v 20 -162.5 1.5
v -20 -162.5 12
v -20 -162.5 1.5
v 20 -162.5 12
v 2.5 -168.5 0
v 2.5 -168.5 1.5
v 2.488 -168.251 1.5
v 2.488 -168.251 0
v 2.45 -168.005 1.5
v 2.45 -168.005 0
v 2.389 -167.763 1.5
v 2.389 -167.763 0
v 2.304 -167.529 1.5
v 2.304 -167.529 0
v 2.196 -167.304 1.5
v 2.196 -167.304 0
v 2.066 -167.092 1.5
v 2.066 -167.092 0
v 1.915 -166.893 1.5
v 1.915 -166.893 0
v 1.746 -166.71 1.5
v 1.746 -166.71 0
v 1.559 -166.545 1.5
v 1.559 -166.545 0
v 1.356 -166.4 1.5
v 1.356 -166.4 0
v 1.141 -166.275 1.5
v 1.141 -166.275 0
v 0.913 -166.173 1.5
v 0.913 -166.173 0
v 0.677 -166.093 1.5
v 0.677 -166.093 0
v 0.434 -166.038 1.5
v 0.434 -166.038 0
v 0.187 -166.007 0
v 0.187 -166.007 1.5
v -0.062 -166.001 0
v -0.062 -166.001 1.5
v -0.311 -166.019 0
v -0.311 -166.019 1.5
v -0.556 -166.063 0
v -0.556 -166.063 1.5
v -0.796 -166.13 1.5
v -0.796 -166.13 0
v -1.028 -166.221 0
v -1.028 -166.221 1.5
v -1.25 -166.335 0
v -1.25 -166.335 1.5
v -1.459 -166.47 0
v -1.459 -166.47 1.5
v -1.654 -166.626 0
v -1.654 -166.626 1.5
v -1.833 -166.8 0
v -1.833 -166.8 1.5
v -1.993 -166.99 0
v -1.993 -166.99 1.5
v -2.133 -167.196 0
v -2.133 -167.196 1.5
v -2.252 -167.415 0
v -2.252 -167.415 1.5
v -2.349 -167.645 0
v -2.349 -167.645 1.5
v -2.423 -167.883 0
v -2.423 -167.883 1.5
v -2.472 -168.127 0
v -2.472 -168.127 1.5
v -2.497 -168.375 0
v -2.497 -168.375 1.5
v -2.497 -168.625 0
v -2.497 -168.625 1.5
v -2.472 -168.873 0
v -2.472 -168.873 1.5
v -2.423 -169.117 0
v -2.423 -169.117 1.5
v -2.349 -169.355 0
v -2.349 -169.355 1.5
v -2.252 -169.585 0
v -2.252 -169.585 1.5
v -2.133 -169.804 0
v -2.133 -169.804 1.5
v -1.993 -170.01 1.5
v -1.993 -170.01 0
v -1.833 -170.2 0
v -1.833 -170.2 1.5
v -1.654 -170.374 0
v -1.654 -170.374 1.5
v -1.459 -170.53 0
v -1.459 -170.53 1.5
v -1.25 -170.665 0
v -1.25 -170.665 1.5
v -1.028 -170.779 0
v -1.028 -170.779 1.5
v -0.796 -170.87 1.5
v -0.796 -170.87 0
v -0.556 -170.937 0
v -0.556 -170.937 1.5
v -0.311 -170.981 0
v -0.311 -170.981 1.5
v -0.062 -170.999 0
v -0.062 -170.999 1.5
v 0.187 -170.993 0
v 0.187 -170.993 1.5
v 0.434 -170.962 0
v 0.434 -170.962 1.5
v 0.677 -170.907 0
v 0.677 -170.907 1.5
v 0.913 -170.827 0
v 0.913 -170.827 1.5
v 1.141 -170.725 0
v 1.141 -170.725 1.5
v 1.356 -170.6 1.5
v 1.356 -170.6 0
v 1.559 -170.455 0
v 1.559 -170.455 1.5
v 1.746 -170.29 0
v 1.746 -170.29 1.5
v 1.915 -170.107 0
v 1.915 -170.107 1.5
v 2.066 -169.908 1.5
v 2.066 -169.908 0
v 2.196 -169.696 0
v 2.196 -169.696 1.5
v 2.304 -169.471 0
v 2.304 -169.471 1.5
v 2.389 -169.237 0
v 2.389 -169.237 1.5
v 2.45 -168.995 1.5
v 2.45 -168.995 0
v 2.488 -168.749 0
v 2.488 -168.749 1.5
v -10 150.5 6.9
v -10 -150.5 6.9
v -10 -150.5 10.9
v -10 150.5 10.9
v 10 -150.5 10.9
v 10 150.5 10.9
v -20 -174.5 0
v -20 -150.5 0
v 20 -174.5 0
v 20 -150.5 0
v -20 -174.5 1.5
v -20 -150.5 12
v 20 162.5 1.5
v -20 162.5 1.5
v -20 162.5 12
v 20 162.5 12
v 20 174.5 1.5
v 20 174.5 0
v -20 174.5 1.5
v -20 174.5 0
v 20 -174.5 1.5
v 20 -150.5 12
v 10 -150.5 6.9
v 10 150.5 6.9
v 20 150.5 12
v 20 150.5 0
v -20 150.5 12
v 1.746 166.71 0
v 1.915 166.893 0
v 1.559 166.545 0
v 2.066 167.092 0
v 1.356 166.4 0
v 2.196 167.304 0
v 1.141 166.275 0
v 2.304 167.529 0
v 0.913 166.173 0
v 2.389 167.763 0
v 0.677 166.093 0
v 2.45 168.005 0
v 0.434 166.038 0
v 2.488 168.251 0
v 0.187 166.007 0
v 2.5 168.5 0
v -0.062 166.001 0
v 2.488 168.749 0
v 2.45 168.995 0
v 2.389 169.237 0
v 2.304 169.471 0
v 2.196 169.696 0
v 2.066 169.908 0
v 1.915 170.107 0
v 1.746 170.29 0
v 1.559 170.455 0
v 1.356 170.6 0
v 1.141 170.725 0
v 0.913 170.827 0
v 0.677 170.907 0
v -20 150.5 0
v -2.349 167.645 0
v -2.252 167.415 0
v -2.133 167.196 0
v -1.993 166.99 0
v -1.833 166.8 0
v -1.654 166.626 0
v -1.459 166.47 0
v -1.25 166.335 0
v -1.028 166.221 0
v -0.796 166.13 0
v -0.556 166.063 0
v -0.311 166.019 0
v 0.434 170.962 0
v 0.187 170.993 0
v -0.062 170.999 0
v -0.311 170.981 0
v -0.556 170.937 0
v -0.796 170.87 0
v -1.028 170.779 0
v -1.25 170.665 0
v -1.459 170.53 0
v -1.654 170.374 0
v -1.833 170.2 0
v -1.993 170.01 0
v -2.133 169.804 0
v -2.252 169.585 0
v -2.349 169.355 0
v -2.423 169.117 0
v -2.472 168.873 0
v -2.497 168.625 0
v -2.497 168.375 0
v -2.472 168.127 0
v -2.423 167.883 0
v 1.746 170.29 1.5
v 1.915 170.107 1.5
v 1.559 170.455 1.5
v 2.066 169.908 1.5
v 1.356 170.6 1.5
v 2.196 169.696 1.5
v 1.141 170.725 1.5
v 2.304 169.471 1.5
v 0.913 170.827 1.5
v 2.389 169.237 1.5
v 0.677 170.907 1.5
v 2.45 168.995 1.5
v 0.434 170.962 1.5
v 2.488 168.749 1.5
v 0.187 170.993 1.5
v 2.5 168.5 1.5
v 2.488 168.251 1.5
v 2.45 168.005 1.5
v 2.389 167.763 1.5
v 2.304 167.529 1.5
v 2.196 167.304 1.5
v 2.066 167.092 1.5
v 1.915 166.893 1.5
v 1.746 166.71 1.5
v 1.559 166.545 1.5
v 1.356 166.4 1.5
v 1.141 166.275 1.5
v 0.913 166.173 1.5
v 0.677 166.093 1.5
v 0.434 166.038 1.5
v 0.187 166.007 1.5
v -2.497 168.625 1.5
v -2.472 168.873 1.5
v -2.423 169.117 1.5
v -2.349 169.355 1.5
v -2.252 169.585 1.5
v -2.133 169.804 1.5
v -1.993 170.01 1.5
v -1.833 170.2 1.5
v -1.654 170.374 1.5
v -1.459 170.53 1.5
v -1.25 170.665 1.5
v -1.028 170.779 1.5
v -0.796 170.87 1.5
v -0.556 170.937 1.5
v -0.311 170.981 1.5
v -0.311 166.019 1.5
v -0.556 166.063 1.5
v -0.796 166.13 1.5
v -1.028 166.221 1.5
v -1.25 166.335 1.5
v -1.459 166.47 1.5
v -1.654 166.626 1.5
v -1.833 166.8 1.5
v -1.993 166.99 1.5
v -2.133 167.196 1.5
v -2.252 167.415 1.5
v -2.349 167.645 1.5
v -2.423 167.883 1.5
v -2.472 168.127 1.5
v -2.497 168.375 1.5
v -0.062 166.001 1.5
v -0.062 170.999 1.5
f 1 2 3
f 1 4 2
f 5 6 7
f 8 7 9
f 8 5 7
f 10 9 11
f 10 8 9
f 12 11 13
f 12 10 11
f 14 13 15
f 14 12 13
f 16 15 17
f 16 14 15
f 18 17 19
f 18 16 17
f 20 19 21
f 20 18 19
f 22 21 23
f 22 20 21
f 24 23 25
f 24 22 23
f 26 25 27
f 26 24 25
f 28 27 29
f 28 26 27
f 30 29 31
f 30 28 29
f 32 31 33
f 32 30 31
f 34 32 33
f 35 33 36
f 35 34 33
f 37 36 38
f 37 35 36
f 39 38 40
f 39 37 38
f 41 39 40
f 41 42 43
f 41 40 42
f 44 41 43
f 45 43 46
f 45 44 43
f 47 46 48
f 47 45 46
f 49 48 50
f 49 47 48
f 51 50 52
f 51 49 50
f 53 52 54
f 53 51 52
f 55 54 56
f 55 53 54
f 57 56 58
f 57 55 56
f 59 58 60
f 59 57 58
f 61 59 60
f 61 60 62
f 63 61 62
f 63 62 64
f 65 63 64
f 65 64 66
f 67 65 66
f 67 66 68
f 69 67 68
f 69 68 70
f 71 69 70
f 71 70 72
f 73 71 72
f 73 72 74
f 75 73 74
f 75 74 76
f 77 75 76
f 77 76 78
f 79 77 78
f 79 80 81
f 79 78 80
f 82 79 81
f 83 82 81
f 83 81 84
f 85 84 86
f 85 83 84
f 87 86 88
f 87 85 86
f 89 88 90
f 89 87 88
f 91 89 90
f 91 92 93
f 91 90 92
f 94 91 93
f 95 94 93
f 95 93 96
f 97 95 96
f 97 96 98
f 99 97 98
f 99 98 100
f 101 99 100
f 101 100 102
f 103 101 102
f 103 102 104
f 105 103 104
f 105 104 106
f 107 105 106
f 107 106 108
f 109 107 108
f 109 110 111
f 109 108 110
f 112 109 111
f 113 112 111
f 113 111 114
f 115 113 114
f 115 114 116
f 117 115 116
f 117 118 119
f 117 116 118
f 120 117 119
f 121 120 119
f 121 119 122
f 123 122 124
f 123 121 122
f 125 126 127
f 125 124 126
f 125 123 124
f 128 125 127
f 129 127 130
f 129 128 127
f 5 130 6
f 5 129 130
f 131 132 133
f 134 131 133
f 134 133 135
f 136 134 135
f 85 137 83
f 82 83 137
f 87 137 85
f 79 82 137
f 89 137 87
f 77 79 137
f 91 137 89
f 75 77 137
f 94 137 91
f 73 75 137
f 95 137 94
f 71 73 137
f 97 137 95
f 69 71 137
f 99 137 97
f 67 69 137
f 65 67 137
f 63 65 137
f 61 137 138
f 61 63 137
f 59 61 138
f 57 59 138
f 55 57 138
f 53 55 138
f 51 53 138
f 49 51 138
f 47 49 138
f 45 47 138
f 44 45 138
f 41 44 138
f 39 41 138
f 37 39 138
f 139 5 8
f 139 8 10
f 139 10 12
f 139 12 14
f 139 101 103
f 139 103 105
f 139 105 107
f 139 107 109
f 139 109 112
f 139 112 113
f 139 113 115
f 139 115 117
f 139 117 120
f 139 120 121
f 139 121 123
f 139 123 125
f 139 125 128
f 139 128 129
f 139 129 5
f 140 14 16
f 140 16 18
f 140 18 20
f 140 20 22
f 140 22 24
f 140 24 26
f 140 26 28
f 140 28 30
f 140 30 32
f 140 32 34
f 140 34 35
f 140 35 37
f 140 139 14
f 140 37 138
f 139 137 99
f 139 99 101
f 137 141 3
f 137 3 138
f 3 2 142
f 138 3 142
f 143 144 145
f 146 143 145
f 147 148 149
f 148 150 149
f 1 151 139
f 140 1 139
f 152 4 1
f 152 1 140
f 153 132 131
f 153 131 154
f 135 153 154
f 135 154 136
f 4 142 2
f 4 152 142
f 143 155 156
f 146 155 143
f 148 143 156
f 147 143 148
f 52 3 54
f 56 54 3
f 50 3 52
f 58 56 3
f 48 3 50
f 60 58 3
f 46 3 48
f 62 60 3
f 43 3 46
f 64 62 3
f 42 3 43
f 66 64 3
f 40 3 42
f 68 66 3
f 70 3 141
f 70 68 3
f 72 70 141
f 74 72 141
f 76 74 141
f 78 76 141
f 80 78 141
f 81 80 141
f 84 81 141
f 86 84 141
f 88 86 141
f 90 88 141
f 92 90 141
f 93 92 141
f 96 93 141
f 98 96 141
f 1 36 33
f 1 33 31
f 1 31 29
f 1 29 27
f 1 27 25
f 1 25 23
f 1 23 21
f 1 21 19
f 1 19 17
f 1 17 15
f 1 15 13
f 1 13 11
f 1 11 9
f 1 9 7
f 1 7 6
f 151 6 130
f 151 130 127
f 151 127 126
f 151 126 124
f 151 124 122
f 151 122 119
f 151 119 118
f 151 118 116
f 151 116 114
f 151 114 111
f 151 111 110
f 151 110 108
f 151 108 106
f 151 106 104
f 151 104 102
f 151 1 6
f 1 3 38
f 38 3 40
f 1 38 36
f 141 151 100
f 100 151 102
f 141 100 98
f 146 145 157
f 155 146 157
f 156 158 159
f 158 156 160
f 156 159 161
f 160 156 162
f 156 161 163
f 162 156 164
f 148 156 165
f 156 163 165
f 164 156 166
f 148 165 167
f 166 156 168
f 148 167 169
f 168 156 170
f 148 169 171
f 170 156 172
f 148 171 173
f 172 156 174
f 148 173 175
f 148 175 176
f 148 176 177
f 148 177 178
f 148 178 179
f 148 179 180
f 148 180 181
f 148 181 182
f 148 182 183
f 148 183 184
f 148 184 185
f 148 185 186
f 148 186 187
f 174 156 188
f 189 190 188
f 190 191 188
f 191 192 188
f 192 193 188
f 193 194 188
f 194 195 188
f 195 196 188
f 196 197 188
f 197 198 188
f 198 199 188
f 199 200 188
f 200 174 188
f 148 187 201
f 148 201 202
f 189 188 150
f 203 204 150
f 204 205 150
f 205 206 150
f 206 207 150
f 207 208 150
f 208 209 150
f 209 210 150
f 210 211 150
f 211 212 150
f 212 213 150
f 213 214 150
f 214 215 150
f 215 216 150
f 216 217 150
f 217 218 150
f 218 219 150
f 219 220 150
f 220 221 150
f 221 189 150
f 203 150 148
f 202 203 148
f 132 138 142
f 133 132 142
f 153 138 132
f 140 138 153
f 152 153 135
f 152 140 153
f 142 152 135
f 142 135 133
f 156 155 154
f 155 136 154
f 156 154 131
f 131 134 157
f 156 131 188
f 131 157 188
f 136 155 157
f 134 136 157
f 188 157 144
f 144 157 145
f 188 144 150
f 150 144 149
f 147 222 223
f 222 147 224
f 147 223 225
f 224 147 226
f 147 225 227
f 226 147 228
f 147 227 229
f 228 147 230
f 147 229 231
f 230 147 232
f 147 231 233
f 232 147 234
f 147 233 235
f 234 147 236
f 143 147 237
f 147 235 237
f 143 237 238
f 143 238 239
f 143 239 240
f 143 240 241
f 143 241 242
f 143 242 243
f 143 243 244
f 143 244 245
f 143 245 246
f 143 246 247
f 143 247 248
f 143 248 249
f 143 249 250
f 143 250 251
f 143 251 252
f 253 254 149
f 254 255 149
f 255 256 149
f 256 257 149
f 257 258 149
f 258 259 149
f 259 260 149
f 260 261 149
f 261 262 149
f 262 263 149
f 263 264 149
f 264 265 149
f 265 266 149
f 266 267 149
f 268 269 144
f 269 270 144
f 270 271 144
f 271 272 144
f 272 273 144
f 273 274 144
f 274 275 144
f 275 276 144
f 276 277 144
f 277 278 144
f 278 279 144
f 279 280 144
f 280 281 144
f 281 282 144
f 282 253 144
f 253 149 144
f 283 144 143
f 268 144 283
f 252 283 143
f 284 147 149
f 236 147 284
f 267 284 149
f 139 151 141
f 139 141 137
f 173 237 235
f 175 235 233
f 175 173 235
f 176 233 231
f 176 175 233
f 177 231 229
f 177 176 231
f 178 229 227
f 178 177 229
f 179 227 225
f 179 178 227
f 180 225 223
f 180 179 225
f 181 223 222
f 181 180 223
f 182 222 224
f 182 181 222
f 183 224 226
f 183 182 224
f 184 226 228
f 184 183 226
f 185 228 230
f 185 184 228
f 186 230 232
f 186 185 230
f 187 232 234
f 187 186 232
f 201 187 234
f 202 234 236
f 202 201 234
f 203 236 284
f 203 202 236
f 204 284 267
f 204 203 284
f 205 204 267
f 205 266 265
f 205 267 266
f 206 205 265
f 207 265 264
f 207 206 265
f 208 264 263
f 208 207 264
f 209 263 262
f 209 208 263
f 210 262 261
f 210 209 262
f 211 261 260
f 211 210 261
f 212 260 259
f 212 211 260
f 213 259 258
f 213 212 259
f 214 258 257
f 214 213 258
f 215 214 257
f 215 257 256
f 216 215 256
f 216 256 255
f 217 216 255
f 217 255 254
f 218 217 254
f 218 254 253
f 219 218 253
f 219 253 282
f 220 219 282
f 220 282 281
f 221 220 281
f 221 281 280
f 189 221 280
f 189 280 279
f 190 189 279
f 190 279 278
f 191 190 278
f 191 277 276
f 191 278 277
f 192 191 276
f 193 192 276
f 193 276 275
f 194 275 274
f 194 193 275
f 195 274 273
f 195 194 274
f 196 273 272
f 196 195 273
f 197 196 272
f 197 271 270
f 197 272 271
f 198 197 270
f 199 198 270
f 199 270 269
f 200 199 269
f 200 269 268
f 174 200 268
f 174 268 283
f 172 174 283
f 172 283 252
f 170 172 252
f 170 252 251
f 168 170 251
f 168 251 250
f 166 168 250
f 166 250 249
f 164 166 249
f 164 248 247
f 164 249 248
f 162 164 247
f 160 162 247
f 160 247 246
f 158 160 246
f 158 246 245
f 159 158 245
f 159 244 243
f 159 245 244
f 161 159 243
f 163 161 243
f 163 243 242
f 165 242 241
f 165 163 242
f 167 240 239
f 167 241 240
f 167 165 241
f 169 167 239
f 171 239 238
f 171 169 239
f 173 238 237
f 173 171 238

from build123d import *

# Parameters (mm, degrees)
SKETCH_W          = 20
SKETCH_H          = 4
PAD_DEPTH         = 162.5
PAD001_DEPTH      = 20
SKETCH002_R       = 2.5
POCKET_DEPTH      = 0.001
POCKET_DEPTH_BACK = -12.001


with BuildPart() as part:
    # Sketch → Pad (new body, symmetric)
    with BuildSketch(Plane.XZ):
        with Locations((0, 8.9)):
            Rectangle(SKETCH_W, SKETCH_H)
    extrude(amount=PAD_DEPTH, both=True)

    # Sketch001 → Pad001 (join, symmetric)
    with BuildSketch(Plane.YZ):
        Polygon((150.5, 12), (150.5, 0), (174.5, 0), (174.5, 1.5), (162.5, 1.5), (162.5, 12), align=None)
        Polygon((-162.5, 12), (-162.5, 1.5), (-174.5, 1.5), (-174.5, 0), (-150.5, 0), (-150.5, 12), align=None)
    extrude(amount=PAD001_DEPTH, both=True)

    # Sketch002 → Pocket (cut, two sides)
    with BuildSketch(Plane.XY) as pocket_sk:
        with Locations((0, -168.5)):
            Circle(SKETCH002_R)
        with Locations((0, 168.5)):
            Circle(SKETCH002_R)
    extrude(amount=-POCKET_DEPTH, mode=Mode.SUBTRACT)
    extrude(pocket_sk.sketch, amount=-POCKET_DEPTH_BACK, mode=Mode.SUBTRACT)


solid = part.part
